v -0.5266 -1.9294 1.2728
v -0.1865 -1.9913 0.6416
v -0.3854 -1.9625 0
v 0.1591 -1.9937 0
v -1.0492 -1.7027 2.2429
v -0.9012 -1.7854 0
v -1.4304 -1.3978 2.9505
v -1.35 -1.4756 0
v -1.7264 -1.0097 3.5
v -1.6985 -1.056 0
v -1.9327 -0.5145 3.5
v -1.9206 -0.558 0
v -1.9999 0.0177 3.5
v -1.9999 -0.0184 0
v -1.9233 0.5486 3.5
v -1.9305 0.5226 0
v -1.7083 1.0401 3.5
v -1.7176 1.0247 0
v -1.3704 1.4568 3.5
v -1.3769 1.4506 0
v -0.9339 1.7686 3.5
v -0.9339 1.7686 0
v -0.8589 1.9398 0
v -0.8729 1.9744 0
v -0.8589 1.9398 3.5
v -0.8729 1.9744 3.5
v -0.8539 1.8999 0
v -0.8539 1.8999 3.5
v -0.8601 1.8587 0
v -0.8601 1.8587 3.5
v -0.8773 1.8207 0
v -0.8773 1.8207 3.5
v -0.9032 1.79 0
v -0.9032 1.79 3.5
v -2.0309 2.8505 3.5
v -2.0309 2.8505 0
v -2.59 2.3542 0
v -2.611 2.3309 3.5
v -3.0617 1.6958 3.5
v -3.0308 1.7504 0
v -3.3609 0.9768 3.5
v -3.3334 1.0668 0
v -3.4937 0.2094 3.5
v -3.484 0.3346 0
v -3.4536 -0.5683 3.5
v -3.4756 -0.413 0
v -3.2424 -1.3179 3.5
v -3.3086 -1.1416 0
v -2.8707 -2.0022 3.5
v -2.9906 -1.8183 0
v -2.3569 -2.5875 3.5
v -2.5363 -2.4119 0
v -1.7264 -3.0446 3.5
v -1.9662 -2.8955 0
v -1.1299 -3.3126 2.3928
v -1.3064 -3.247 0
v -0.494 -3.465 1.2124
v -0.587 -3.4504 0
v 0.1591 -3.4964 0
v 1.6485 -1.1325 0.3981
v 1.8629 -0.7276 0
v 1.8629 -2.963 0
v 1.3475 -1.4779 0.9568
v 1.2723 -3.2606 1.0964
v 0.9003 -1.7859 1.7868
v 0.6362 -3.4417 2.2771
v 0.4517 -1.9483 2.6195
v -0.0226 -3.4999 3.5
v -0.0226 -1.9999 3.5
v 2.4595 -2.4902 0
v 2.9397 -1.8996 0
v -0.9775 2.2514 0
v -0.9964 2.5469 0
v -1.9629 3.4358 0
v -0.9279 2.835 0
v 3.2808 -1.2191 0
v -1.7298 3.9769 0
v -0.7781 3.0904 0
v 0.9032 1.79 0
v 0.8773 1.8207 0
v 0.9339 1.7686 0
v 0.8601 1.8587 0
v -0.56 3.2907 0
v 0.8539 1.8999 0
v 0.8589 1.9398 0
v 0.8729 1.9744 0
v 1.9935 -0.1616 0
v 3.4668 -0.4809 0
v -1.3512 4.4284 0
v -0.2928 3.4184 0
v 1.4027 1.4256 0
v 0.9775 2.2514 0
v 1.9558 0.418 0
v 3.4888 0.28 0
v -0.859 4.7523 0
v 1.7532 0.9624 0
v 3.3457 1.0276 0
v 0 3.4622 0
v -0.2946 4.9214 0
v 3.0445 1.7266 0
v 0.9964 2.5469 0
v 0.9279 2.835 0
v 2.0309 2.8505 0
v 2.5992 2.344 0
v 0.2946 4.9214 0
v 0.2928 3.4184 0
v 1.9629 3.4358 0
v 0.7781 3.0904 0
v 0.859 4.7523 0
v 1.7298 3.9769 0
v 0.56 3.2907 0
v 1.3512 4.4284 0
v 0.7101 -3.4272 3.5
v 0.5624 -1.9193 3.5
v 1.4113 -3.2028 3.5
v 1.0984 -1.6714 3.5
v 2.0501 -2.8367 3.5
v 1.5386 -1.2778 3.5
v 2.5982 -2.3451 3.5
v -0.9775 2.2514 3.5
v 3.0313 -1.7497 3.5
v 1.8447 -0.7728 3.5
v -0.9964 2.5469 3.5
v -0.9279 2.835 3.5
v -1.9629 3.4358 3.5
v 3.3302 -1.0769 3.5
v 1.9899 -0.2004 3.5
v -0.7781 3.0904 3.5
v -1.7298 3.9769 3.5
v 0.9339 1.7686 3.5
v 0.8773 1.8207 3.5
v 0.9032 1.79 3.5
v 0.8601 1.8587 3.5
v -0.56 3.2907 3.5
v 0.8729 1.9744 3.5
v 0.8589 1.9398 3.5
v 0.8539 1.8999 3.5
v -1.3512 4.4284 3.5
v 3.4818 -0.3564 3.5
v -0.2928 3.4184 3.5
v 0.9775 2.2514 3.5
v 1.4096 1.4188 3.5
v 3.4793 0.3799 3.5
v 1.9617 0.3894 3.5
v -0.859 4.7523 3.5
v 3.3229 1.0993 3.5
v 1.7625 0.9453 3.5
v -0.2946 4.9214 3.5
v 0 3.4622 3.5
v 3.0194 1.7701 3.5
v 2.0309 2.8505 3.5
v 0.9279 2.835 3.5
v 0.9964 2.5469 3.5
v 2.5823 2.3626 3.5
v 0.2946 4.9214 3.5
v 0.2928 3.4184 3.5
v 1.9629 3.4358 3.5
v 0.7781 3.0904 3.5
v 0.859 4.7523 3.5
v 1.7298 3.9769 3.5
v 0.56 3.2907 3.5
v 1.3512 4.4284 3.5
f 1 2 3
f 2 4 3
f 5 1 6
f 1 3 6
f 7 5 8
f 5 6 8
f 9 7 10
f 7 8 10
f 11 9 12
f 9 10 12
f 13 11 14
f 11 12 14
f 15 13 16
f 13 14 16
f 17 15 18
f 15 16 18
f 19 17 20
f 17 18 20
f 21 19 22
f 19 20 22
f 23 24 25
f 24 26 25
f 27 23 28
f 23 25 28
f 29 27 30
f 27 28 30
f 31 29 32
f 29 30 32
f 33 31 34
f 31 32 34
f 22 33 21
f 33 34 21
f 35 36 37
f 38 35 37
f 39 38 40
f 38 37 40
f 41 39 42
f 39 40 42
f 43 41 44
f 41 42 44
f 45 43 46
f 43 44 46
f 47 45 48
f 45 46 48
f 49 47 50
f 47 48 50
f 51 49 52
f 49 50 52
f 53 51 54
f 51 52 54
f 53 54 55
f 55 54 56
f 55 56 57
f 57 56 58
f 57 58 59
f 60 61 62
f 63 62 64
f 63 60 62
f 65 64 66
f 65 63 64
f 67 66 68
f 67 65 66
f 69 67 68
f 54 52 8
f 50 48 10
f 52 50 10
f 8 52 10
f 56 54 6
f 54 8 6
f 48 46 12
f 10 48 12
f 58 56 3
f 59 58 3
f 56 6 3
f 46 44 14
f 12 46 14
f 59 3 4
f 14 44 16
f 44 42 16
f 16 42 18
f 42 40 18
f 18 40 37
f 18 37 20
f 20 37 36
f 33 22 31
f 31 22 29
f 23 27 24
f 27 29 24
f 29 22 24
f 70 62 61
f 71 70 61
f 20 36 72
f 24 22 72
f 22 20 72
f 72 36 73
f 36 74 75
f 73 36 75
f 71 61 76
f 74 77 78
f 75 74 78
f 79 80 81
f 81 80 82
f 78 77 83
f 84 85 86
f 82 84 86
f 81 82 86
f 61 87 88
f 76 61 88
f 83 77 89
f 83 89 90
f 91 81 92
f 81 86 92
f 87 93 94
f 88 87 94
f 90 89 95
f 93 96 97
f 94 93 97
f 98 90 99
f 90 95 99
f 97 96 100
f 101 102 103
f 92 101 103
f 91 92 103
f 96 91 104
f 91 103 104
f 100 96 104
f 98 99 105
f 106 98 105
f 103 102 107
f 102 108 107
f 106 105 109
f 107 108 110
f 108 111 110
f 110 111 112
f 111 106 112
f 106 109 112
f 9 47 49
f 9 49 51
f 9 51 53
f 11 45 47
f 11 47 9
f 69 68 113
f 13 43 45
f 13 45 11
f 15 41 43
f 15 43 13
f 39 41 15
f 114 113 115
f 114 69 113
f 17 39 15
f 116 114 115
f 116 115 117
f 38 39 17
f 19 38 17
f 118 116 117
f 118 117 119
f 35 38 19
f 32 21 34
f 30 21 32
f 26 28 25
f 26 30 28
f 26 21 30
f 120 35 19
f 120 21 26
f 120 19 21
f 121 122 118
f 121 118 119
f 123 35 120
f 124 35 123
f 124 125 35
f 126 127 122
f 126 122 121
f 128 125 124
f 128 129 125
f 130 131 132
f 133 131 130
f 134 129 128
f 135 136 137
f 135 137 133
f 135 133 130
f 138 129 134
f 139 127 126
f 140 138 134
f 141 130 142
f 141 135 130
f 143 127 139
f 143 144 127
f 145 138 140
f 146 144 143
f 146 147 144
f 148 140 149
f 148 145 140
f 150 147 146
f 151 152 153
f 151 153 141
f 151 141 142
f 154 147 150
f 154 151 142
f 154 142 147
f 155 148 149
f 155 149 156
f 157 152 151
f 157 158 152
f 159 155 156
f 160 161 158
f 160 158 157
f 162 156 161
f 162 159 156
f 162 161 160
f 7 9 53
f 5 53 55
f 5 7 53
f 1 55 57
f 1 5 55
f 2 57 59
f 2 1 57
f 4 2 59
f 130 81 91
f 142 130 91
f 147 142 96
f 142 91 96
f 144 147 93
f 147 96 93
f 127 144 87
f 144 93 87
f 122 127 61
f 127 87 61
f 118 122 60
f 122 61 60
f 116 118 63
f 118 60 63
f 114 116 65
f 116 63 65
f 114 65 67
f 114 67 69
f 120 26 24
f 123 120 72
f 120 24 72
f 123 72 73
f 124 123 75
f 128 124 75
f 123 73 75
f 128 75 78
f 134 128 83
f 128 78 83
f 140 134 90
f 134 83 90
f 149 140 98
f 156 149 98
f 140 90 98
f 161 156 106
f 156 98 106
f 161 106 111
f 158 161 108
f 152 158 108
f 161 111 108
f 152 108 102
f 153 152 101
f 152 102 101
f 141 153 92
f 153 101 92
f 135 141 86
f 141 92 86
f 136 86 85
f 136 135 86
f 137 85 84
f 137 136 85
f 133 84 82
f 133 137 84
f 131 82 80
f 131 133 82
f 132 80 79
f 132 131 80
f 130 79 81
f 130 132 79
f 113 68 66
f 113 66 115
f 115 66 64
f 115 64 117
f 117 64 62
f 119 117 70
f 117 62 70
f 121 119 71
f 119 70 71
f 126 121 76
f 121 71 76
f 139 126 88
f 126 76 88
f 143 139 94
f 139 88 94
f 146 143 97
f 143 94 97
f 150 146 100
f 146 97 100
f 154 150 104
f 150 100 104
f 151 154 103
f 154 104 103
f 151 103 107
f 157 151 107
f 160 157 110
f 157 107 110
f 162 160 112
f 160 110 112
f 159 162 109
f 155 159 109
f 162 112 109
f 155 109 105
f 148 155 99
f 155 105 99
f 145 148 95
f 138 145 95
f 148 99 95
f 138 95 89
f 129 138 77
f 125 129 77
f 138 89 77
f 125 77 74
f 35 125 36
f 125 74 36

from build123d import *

# Parameters (mm, degrees)
F1_DEPTH = 3.5
F2_R     = 0.15
F4_DEPTH = 25


with BuildPart() as f1:
    # F0 (on Top) → F1 (new body)
    with BuildSketch(Plane.XY):
        with BuildLine():
            ThreePointArc((2.0309193372, 2.850502876), (0, 4.9428488608), (-2.0309193372, 2.850502876))
            ThreePointArc((-2.0309193372, 2.850502876), (0, -3.5), (2.0309193372, 2.850502876))
        make_face()
        with BuildLine():
            ThreePointArc((0.7830913136, 1.8403173625), (0, -2), (-0.7830913136, 1.8403173625))
            ThreePointArc((-0.7830913136, 1.8403173625), (0, 3.4622241035), (0.7830913136, 1.8403173625))
        make_face(mode=Mode.SUBTRACT)
    extrude(amount=F1_DEPTH)

    # F2
    f2_edges = [f1.edges().sort_by_distance(p)[0] for p in [
        (-0.783091, 1.840317, 1.75),
        (0.783091, 1.840317, 1.75),
    ]]
    fillet(f2_edges, radius=F2_R)

    # F3 (on Front) → F4 (cut)
    with BuildSketch(Plane.XZ):
        Polygon((-2.6012919649, 8.286720852), (-4.2398504038, 8.1655834162), (3.1280116344, -5.5110100095), (4.8318293002, -5.5110100095), align=None)
    extrude(amount=F4_DEPTH, mode=Mode.SUBTRACT)


solid = f1.part
